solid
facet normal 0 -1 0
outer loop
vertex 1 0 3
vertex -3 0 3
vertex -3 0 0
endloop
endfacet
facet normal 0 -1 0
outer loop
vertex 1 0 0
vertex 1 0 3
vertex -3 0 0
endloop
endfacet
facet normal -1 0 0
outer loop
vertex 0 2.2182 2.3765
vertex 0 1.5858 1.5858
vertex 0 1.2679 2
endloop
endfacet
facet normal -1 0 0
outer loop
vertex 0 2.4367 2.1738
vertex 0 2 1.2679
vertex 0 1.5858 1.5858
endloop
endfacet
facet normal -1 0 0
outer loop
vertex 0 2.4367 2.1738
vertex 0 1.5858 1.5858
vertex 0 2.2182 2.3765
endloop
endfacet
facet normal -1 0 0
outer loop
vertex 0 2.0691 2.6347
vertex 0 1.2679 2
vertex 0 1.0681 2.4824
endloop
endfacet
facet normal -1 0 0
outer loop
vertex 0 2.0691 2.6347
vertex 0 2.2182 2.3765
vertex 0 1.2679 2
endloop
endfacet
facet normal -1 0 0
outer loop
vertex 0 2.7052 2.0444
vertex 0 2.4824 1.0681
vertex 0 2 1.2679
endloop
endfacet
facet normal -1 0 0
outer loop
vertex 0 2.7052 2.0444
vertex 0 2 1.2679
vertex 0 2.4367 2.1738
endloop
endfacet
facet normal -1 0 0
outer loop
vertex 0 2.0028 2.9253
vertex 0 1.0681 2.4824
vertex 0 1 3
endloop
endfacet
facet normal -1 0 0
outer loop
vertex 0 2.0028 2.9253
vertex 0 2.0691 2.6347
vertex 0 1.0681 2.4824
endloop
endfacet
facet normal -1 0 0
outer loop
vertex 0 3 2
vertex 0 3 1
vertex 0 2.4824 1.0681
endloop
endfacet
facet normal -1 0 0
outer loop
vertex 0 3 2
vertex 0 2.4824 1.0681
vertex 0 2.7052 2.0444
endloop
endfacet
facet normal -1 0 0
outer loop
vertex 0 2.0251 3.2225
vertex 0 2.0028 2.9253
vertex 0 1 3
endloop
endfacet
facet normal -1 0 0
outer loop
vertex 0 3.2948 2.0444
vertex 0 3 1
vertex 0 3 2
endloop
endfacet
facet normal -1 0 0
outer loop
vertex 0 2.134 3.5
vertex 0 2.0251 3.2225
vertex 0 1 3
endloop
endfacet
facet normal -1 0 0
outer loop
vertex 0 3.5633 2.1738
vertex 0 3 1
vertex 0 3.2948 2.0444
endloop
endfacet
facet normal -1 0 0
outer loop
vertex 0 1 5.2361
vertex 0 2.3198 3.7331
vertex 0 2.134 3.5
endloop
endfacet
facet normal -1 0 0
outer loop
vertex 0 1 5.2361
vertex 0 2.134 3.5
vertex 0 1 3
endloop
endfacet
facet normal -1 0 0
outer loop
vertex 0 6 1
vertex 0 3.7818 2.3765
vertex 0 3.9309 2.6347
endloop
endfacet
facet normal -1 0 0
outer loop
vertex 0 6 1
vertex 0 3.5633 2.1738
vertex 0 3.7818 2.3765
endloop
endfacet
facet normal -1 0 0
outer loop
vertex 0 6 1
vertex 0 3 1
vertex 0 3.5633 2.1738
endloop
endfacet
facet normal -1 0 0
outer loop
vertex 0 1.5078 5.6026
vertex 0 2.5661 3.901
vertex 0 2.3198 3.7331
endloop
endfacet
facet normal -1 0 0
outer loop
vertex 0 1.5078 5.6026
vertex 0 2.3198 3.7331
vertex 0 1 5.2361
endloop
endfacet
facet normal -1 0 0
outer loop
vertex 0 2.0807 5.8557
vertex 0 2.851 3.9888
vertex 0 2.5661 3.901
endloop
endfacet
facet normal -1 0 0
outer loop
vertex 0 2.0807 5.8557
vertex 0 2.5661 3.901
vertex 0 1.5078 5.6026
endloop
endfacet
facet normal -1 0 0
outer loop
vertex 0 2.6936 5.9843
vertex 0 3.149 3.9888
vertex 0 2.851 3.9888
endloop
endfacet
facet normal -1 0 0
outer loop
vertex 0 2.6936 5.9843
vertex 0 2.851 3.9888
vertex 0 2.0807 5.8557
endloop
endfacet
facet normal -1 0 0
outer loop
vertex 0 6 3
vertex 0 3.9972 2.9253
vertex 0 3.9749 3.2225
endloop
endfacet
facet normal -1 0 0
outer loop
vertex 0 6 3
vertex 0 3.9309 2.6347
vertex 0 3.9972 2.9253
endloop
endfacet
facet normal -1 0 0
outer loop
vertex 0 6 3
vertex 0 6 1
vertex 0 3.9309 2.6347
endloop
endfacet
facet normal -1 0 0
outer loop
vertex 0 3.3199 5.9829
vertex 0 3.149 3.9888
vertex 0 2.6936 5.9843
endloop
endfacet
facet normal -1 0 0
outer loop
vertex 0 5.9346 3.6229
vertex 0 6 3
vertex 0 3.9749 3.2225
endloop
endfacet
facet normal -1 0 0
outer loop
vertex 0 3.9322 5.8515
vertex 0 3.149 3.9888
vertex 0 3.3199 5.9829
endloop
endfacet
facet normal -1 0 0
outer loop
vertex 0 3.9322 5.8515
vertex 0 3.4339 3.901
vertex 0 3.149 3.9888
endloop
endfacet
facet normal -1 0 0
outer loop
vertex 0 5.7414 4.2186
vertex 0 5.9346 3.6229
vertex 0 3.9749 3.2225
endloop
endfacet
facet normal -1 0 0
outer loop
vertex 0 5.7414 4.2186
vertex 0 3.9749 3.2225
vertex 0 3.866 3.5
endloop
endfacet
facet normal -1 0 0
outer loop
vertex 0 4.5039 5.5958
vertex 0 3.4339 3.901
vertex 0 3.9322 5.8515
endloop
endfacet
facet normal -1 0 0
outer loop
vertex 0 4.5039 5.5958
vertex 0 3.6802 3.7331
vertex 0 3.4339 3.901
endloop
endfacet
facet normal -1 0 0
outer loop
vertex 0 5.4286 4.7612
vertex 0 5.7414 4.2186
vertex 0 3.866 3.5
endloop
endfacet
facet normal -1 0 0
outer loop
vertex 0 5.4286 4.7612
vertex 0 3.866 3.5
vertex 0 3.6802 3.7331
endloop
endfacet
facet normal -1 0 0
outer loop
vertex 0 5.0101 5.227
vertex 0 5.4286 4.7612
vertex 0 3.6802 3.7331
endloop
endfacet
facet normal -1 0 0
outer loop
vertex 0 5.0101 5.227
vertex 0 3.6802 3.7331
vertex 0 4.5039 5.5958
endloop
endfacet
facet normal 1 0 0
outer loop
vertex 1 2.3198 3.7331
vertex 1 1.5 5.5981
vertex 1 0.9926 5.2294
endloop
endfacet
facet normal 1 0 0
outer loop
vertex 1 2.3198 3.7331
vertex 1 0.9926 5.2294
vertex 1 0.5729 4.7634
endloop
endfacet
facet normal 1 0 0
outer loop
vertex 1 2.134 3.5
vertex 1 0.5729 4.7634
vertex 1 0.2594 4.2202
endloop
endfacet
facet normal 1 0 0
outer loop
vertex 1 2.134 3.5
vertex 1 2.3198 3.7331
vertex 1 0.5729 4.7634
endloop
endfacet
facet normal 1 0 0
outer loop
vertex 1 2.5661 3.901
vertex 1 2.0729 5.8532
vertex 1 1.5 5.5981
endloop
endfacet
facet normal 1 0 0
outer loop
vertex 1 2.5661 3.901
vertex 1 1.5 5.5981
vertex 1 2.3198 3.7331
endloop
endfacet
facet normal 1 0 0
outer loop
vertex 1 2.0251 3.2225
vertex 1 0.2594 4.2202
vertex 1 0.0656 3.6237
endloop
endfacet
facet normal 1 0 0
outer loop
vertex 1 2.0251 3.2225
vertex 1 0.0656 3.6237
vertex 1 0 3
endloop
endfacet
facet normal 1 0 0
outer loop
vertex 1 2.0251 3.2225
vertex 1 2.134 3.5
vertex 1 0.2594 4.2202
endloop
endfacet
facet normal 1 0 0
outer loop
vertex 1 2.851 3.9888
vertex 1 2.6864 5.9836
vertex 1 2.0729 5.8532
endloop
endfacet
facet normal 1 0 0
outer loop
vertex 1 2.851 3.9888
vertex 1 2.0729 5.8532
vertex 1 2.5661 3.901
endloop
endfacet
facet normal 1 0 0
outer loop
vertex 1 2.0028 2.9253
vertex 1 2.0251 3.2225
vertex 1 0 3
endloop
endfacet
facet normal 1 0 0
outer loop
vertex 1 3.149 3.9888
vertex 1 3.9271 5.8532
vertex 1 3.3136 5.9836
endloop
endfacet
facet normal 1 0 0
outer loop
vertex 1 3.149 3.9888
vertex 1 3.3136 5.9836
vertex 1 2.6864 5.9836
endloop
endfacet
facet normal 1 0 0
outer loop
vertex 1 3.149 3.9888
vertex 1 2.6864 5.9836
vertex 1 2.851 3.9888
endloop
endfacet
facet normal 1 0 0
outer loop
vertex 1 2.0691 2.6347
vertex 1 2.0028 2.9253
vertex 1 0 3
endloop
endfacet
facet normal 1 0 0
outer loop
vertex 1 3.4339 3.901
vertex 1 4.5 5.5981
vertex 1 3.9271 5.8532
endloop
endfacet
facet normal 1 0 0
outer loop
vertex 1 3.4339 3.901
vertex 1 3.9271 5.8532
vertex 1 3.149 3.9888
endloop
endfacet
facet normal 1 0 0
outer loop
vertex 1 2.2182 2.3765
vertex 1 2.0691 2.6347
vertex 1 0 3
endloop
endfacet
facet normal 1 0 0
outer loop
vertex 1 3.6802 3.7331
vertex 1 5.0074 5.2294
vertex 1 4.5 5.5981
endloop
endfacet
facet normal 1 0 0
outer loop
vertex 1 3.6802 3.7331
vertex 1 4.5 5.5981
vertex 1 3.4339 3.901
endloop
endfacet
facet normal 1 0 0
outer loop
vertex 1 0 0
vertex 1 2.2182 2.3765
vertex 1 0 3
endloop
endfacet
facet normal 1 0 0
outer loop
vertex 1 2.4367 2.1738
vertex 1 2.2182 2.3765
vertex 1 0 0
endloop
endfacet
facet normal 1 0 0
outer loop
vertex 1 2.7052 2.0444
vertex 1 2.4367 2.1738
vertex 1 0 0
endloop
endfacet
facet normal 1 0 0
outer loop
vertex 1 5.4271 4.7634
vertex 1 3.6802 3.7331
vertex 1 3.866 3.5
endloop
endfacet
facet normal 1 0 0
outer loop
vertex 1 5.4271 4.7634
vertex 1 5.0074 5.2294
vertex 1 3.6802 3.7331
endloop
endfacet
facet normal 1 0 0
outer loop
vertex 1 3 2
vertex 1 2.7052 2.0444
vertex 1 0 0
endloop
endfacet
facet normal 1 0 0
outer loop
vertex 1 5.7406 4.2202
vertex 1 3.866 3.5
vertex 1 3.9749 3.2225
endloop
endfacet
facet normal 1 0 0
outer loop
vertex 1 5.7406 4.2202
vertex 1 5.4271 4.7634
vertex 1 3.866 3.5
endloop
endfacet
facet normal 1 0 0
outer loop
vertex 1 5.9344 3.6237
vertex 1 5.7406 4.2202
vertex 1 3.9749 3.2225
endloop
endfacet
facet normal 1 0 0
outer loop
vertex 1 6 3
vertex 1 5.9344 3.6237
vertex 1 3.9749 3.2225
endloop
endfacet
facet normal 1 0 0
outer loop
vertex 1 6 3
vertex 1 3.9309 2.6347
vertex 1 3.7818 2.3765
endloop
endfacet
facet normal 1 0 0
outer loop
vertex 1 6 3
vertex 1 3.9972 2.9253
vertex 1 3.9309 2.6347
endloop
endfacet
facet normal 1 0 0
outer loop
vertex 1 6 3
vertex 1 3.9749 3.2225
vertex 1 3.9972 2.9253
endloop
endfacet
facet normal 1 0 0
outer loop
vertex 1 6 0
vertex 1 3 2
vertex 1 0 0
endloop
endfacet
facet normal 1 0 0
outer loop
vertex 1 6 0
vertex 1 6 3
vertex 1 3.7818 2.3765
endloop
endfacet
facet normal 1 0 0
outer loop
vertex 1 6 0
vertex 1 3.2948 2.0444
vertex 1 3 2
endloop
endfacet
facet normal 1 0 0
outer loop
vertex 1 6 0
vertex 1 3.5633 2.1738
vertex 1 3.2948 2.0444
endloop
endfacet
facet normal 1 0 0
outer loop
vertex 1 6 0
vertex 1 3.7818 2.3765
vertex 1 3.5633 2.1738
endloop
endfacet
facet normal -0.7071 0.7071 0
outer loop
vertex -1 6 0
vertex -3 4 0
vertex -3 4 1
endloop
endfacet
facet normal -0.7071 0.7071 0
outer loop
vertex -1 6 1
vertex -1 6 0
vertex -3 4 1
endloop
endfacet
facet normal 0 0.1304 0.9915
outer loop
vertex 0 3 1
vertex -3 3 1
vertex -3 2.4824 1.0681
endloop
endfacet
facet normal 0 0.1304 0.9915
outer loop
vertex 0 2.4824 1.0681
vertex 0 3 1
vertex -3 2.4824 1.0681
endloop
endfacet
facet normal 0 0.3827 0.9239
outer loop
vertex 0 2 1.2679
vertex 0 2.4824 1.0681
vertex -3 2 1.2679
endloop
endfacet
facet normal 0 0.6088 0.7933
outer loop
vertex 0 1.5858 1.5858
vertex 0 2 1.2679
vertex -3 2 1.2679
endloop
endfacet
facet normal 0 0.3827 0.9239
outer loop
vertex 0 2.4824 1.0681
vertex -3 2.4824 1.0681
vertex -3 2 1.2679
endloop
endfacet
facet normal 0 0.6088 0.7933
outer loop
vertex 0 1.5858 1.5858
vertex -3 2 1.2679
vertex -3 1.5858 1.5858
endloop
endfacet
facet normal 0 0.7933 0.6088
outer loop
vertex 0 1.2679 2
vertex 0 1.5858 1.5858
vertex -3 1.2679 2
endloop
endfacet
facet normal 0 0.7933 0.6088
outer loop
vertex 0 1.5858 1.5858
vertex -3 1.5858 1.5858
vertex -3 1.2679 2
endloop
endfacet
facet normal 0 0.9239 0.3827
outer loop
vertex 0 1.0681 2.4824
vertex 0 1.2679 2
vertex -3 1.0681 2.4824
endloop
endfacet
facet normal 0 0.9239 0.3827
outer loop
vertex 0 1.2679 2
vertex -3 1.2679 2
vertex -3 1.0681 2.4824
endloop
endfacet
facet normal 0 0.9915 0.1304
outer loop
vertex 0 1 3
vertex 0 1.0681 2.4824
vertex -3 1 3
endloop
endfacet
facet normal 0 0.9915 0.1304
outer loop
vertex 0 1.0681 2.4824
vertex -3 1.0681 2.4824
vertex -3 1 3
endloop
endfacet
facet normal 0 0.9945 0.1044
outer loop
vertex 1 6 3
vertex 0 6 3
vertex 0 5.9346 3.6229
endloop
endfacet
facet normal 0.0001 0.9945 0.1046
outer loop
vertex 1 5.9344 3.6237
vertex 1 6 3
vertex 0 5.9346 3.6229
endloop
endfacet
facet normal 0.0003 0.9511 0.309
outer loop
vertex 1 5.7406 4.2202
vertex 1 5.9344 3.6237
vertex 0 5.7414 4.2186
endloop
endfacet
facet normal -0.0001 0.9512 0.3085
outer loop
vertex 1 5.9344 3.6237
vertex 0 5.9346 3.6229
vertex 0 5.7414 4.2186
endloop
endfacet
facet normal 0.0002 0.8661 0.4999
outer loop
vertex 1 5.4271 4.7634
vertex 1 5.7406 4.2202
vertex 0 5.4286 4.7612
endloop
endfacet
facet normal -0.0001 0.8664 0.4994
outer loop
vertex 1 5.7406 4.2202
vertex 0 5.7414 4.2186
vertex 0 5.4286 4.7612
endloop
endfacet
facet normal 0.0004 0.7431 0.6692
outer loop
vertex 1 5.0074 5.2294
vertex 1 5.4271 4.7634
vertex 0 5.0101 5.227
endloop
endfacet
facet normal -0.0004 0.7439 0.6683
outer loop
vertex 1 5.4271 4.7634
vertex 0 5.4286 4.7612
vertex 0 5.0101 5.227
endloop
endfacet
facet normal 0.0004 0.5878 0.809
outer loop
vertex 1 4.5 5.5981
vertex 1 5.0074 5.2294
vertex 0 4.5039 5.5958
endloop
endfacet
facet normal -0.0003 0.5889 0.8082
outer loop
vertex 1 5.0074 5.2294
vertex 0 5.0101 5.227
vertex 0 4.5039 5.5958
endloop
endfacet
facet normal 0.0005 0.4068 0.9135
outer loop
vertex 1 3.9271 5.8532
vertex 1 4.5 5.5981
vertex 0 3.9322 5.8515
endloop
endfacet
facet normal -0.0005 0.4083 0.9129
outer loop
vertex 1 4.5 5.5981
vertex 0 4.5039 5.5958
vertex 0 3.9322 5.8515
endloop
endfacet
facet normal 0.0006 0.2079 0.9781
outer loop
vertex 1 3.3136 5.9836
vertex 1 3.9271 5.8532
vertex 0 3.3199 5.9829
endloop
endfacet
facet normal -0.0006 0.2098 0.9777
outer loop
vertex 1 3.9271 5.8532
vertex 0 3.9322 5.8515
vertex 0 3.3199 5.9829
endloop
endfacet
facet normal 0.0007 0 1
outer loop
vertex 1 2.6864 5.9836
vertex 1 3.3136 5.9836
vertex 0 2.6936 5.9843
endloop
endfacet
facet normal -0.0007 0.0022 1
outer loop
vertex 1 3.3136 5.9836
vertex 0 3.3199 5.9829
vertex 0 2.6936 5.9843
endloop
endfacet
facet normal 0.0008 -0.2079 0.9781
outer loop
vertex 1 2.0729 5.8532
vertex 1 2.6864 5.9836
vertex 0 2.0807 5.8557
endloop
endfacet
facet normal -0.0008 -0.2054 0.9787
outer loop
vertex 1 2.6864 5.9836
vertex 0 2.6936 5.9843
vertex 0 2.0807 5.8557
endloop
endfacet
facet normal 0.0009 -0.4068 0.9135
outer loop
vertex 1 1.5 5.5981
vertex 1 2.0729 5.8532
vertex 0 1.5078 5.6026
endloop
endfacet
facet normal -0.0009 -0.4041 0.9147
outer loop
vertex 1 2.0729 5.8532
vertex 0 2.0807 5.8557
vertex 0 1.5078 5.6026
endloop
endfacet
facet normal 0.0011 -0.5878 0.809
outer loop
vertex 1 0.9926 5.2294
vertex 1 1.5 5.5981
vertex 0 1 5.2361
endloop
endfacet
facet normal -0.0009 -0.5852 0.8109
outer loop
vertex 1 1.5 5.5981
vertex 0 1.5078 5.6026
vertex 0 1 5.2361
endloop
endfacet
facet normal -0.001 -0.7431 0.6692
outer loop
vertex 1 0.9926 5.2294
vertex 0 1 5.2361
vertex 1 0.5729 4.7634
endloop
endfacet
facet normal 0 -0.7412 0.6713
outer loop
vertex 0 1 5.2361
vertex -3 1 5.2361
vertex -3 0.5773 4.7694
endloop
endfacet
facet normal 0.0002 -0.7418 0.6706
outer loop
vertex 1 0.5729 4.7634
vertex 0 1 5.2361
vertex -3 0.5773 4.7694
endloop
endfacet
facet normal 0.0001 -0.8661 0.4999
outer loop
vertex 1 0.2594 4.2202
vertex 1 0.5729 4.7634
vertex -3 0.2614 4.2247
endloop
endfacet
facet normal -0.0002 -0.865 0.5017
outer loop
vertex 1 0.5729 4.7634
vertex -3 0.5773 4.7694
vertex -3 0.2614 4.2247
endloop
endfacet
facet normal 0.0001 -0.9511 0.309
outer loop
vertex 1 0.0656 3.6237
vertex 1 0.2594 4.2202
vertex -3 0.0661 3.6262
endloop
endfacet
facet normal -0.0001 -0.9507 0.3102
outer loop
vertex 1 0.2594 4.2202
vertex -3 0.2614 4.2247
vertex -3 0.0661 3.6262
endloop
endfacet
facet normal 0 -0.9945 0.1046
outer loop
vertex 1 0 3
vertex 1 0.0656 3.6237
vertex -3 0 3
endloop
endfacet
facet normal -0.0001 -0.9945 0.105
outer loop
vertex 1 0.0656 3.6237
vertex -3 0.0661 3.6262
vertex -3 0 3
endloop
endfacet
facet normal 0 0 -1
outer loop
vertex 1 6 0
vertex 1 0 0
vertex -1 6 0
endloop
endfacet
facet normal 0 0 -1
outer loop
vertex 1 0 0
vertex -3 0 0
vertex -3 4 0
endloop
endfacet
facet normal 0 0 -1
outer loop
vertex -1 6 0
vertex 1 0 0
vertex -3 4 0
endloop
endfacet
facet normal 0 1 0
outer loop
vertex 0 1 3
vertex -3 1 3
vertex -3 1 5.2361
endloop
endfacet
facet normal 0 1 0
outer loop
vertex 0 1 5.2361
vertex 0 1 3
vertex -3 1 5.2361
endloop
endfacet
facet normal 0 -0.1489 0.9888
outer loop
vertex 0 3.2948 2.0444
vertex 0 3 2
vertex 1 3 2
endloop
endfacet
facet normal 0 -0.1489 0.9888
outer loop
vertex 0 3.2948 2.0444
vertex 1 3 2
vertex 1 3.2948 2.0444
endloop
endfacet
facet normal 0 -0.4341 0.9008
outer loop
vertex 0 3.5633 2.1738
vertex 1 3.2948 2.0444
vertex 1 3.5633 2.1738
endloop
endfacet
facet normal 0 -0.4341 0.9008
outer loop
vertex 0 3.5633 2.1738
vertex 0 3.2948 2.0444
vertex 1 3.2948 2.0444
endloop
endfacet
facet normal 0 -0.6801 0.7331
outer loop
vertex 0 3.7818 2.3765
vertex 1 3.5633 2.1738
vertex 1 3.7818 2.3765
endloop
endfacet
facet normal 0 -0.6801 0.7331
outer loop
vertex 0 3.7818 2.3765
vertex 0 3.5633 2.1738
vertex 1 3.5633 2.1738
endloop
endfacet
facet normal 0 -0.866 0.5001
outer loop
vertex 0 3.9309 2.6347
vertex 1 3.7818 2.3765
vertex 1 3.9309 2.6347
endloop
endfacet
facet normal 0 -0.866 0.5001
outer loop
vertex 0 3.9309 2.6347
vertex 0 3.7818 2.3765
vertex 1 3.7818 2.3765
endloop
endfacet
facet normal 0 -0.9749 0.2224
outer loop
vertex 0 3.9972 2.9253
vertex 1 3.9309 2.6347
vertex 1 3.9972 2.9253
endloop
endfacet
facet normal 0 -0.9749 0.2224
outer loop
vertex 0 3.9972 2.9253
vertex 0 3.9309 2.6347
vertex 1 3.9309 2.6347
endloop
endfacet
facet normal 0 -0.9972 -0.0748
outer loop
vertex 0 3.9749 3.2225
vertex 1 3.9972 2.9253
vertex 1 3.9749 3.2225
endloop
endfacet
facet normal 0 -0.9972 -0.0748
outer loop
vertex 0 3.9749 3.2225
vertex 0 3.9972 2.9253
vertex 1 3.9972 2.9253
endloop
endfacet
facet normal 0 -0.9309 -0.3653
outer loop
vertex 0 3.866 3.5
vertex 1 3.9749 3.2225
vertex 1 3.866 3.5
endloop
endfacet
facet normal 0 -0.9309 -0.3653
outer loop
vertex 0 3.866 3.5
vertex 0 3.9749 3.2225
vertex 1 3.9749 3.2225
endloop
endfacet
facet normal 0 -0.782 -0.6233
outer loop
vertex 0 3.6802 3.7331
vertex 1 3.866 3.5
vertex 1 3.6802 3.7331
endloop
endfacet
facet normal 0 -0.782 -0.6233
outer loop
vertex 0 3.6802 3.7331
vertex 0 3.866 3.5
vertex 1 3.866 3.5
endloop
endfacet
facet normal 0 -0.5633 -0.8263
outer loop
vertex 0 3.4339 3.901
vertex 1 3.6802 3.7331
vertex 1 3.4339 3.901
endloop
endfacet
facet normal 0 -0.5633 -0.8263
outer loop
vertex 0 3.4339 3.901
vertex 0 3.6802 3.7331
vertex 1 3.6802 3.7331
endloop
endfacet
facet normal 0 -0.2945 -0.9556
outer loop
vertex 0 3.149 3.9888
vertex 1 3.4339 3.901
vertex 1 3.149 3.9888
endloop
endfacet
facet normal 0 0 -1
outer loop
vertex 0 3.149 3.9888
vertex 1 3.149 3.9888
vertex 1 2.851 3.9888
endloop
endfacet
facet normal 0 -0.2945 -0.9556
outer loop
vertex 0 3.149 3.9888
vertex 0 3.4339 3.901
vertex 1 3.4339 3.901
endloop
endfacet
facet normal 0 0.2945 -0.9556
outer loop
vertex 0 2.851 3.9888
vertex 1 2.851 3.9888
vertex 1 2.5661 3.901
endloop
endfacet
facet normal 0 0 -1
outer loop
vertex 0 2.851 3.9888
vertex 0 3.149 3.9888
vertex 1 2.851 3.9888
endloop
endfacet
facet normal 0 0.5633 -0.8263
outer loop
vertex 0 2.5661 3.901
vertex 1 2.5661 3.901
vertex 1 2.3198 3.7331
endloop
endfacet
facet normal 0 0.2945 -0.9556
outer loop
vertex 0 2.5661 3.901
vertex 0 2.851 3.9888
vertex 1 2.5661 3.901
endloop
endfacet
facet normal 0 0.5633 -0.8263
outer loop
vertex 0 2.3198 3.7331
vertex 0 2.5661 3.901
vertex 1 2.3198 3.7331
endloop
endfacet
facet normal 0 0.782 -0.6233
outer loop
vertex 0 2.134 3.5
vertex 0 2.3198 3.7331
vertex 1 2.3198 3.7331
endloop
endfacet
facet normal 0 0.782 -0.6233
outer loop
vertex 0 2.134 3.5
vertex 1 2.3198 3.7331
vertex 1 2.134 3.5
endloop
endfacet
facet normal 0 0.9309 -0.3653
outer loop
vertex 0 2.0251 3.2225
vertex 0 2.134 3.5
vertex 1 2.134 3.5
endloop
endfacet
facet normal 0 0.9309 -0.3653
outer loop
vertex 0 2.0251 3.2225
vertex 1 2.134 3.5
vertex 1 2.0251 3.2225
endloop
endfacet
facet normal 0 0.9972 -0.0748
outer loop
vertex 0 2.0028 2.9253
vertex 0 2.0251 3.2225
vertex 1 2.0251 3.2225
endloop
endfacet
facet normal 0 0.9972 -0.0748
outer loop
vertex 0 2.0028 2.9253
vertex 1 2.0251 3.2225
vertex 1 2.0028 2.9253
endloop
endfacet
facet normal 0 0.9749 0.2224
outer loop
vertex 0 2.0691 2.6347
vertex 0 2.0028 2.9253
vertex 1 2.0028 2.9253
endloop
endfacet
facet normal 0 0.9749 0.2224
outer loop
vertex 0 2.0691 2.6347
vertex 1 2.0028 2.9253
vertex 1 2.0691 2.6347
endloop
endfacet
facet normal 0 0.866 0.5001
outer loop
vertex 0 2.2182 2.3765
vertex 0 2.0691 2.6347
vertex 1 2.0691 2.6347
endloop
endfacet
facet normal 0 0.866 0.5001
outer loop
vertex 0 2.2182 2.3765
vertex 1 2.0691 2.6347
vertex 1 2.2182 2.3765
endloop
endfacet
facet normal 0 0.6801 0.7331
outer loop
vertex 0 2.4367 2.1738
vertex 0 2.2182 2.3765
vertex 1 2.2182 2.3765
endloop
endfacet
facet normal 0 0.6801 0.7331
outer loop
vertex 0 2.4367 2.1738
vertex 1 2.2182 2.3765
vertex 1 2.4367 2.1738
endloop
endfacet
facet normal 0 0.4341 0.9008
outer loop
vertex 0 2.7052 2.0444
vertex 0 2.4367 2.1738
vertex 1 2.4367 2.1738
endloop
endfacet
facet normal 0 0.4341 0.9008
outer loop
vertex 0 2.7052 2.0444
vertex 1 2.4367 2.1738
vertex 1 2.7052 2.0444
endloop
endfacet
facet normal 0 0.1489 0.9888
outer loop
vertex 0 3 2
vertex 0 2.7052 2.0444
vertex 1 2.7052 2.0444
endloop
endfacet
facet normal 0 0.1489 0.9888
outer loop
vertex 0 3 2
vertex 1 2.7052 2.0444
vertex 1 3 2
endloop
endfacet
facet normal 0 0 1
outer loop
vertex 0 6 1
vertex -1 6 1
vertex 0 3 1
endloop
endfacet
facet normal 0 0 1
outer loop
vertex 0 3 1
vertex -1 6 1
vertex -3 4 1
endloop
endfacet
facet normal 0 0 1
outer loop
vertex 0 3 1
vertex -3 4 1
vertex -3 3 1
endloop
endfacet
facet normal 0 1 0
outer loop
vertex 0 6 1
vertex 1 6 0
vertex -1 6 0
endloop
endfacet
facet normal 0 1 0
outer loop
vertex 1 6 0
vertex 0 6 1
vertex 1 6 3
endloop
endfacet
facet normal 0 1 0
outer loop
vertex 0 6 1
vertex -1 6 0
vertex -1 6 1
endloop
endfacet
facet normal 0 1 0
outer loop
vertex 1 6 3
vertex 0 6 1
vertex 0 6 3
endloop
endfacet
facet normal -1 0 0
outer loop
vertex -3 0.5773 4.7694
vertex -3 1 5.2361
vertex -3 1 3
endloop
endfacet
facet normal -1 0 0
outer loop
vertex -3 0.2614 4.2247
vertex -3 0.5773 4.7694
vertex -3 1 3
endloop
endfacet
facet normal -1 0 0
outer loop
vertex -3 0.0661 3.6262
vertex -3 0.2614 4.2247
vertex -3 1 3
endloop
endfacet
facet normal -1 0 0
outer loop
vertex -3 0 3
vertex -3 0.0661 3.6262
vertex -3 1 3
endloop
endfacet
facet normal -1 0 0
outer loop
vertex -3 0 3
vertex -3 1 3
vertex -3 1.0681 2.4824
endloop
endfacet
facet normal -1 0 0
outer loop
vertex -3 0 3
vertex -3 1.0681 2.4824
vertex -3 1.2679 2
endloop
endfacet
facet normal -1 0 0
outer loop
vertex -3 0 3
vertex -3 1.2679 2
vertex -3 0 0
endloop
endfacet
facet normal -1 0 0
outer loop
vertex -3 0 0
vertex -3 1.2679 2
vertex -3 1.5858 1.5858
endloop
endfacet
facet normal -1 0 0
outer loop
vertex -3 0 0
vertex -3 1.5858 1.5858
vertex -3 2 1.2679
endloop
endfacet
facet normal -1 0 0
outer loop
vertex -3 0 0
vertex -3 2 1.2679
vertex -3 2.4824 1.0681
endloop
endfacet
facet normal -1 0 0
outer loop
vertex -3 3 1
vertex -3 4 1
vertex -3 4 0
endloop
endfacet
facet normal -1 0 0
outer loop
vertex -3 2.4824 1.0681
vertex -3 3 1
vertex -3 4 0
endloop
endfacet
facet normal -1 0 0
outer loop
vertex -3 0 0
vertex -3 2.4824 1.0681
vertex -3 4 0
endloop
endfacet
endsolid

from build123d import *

# Parameters (mm, degrees)
BOSS_EXTRUDE1_DEPTH      = 1
BOSS_EXTRUDE1_DEPTH_BACK = 3
SKETCH1_R                = 1
CUT_EXTRUDE2_DEPTH       = 3
CHAMFER1_SIZE            = 2


with BuildPart() as part:
    # Sketch1 → Boss-Extrude1 (new, two sides: drawn at the far end of the back side and taken through both)
    with BuildSketch(Plane(origin=(0, 0, 0), x_dir=(0, 0, -1), z_dir=(1, 0, 0)).offset(-BOSS_EXTRUDE1_DEPTH_BACK)):
        with BuildLine():
            Line((0, 0), (0, 6))
            Line((0, 6), (-3, 6))
            ThreePointArc((-3, 6), (-6, 3), (-3, 0))
            Line((-3, 0), (0, 0))
        make_face()
        with Locations((-3, 3)):
            Circle(SKETCH1_R, mode=Mode.SUBTRACT)
    extrude(amount=BOSS_EXTRUDE1_DEPTH + BOSS_EXTRUDE1_DEPTH_BACK)

    # Sketch2 → Cut-Extrude2 (cut)
    with BuildSketch(Plane.ZY.offset(3)):
        with BuildLine():
            Line((3, 1), (7.614070683, 1))
            Line((7.614070683, 1), (7.614070683, 6.174190234))
            Line((7.614070683, 6.174190234), (1, 6.174190234))
            Line((1, 6.174190234), (1, 4.020419478))
            Line((1, 4.020419478), (1, 3))
            ThreePointArc((1, 3), (1.585786438, 1.585786438), (3, 1))
        make_face()
    extrude(amount=-CUT_EXTRUDE2_DEPTH, mode=Mode.SUBTRACT)

    # Chamfer1
    chamfer1_edges = [part.edges().sort_by_distance(p)[0] for p in [
        (-3, 6, 0.5),
    ]]
    chamfer(chamfer1_edges, length=CHAMFER1_SIZE)


solid = part.part
